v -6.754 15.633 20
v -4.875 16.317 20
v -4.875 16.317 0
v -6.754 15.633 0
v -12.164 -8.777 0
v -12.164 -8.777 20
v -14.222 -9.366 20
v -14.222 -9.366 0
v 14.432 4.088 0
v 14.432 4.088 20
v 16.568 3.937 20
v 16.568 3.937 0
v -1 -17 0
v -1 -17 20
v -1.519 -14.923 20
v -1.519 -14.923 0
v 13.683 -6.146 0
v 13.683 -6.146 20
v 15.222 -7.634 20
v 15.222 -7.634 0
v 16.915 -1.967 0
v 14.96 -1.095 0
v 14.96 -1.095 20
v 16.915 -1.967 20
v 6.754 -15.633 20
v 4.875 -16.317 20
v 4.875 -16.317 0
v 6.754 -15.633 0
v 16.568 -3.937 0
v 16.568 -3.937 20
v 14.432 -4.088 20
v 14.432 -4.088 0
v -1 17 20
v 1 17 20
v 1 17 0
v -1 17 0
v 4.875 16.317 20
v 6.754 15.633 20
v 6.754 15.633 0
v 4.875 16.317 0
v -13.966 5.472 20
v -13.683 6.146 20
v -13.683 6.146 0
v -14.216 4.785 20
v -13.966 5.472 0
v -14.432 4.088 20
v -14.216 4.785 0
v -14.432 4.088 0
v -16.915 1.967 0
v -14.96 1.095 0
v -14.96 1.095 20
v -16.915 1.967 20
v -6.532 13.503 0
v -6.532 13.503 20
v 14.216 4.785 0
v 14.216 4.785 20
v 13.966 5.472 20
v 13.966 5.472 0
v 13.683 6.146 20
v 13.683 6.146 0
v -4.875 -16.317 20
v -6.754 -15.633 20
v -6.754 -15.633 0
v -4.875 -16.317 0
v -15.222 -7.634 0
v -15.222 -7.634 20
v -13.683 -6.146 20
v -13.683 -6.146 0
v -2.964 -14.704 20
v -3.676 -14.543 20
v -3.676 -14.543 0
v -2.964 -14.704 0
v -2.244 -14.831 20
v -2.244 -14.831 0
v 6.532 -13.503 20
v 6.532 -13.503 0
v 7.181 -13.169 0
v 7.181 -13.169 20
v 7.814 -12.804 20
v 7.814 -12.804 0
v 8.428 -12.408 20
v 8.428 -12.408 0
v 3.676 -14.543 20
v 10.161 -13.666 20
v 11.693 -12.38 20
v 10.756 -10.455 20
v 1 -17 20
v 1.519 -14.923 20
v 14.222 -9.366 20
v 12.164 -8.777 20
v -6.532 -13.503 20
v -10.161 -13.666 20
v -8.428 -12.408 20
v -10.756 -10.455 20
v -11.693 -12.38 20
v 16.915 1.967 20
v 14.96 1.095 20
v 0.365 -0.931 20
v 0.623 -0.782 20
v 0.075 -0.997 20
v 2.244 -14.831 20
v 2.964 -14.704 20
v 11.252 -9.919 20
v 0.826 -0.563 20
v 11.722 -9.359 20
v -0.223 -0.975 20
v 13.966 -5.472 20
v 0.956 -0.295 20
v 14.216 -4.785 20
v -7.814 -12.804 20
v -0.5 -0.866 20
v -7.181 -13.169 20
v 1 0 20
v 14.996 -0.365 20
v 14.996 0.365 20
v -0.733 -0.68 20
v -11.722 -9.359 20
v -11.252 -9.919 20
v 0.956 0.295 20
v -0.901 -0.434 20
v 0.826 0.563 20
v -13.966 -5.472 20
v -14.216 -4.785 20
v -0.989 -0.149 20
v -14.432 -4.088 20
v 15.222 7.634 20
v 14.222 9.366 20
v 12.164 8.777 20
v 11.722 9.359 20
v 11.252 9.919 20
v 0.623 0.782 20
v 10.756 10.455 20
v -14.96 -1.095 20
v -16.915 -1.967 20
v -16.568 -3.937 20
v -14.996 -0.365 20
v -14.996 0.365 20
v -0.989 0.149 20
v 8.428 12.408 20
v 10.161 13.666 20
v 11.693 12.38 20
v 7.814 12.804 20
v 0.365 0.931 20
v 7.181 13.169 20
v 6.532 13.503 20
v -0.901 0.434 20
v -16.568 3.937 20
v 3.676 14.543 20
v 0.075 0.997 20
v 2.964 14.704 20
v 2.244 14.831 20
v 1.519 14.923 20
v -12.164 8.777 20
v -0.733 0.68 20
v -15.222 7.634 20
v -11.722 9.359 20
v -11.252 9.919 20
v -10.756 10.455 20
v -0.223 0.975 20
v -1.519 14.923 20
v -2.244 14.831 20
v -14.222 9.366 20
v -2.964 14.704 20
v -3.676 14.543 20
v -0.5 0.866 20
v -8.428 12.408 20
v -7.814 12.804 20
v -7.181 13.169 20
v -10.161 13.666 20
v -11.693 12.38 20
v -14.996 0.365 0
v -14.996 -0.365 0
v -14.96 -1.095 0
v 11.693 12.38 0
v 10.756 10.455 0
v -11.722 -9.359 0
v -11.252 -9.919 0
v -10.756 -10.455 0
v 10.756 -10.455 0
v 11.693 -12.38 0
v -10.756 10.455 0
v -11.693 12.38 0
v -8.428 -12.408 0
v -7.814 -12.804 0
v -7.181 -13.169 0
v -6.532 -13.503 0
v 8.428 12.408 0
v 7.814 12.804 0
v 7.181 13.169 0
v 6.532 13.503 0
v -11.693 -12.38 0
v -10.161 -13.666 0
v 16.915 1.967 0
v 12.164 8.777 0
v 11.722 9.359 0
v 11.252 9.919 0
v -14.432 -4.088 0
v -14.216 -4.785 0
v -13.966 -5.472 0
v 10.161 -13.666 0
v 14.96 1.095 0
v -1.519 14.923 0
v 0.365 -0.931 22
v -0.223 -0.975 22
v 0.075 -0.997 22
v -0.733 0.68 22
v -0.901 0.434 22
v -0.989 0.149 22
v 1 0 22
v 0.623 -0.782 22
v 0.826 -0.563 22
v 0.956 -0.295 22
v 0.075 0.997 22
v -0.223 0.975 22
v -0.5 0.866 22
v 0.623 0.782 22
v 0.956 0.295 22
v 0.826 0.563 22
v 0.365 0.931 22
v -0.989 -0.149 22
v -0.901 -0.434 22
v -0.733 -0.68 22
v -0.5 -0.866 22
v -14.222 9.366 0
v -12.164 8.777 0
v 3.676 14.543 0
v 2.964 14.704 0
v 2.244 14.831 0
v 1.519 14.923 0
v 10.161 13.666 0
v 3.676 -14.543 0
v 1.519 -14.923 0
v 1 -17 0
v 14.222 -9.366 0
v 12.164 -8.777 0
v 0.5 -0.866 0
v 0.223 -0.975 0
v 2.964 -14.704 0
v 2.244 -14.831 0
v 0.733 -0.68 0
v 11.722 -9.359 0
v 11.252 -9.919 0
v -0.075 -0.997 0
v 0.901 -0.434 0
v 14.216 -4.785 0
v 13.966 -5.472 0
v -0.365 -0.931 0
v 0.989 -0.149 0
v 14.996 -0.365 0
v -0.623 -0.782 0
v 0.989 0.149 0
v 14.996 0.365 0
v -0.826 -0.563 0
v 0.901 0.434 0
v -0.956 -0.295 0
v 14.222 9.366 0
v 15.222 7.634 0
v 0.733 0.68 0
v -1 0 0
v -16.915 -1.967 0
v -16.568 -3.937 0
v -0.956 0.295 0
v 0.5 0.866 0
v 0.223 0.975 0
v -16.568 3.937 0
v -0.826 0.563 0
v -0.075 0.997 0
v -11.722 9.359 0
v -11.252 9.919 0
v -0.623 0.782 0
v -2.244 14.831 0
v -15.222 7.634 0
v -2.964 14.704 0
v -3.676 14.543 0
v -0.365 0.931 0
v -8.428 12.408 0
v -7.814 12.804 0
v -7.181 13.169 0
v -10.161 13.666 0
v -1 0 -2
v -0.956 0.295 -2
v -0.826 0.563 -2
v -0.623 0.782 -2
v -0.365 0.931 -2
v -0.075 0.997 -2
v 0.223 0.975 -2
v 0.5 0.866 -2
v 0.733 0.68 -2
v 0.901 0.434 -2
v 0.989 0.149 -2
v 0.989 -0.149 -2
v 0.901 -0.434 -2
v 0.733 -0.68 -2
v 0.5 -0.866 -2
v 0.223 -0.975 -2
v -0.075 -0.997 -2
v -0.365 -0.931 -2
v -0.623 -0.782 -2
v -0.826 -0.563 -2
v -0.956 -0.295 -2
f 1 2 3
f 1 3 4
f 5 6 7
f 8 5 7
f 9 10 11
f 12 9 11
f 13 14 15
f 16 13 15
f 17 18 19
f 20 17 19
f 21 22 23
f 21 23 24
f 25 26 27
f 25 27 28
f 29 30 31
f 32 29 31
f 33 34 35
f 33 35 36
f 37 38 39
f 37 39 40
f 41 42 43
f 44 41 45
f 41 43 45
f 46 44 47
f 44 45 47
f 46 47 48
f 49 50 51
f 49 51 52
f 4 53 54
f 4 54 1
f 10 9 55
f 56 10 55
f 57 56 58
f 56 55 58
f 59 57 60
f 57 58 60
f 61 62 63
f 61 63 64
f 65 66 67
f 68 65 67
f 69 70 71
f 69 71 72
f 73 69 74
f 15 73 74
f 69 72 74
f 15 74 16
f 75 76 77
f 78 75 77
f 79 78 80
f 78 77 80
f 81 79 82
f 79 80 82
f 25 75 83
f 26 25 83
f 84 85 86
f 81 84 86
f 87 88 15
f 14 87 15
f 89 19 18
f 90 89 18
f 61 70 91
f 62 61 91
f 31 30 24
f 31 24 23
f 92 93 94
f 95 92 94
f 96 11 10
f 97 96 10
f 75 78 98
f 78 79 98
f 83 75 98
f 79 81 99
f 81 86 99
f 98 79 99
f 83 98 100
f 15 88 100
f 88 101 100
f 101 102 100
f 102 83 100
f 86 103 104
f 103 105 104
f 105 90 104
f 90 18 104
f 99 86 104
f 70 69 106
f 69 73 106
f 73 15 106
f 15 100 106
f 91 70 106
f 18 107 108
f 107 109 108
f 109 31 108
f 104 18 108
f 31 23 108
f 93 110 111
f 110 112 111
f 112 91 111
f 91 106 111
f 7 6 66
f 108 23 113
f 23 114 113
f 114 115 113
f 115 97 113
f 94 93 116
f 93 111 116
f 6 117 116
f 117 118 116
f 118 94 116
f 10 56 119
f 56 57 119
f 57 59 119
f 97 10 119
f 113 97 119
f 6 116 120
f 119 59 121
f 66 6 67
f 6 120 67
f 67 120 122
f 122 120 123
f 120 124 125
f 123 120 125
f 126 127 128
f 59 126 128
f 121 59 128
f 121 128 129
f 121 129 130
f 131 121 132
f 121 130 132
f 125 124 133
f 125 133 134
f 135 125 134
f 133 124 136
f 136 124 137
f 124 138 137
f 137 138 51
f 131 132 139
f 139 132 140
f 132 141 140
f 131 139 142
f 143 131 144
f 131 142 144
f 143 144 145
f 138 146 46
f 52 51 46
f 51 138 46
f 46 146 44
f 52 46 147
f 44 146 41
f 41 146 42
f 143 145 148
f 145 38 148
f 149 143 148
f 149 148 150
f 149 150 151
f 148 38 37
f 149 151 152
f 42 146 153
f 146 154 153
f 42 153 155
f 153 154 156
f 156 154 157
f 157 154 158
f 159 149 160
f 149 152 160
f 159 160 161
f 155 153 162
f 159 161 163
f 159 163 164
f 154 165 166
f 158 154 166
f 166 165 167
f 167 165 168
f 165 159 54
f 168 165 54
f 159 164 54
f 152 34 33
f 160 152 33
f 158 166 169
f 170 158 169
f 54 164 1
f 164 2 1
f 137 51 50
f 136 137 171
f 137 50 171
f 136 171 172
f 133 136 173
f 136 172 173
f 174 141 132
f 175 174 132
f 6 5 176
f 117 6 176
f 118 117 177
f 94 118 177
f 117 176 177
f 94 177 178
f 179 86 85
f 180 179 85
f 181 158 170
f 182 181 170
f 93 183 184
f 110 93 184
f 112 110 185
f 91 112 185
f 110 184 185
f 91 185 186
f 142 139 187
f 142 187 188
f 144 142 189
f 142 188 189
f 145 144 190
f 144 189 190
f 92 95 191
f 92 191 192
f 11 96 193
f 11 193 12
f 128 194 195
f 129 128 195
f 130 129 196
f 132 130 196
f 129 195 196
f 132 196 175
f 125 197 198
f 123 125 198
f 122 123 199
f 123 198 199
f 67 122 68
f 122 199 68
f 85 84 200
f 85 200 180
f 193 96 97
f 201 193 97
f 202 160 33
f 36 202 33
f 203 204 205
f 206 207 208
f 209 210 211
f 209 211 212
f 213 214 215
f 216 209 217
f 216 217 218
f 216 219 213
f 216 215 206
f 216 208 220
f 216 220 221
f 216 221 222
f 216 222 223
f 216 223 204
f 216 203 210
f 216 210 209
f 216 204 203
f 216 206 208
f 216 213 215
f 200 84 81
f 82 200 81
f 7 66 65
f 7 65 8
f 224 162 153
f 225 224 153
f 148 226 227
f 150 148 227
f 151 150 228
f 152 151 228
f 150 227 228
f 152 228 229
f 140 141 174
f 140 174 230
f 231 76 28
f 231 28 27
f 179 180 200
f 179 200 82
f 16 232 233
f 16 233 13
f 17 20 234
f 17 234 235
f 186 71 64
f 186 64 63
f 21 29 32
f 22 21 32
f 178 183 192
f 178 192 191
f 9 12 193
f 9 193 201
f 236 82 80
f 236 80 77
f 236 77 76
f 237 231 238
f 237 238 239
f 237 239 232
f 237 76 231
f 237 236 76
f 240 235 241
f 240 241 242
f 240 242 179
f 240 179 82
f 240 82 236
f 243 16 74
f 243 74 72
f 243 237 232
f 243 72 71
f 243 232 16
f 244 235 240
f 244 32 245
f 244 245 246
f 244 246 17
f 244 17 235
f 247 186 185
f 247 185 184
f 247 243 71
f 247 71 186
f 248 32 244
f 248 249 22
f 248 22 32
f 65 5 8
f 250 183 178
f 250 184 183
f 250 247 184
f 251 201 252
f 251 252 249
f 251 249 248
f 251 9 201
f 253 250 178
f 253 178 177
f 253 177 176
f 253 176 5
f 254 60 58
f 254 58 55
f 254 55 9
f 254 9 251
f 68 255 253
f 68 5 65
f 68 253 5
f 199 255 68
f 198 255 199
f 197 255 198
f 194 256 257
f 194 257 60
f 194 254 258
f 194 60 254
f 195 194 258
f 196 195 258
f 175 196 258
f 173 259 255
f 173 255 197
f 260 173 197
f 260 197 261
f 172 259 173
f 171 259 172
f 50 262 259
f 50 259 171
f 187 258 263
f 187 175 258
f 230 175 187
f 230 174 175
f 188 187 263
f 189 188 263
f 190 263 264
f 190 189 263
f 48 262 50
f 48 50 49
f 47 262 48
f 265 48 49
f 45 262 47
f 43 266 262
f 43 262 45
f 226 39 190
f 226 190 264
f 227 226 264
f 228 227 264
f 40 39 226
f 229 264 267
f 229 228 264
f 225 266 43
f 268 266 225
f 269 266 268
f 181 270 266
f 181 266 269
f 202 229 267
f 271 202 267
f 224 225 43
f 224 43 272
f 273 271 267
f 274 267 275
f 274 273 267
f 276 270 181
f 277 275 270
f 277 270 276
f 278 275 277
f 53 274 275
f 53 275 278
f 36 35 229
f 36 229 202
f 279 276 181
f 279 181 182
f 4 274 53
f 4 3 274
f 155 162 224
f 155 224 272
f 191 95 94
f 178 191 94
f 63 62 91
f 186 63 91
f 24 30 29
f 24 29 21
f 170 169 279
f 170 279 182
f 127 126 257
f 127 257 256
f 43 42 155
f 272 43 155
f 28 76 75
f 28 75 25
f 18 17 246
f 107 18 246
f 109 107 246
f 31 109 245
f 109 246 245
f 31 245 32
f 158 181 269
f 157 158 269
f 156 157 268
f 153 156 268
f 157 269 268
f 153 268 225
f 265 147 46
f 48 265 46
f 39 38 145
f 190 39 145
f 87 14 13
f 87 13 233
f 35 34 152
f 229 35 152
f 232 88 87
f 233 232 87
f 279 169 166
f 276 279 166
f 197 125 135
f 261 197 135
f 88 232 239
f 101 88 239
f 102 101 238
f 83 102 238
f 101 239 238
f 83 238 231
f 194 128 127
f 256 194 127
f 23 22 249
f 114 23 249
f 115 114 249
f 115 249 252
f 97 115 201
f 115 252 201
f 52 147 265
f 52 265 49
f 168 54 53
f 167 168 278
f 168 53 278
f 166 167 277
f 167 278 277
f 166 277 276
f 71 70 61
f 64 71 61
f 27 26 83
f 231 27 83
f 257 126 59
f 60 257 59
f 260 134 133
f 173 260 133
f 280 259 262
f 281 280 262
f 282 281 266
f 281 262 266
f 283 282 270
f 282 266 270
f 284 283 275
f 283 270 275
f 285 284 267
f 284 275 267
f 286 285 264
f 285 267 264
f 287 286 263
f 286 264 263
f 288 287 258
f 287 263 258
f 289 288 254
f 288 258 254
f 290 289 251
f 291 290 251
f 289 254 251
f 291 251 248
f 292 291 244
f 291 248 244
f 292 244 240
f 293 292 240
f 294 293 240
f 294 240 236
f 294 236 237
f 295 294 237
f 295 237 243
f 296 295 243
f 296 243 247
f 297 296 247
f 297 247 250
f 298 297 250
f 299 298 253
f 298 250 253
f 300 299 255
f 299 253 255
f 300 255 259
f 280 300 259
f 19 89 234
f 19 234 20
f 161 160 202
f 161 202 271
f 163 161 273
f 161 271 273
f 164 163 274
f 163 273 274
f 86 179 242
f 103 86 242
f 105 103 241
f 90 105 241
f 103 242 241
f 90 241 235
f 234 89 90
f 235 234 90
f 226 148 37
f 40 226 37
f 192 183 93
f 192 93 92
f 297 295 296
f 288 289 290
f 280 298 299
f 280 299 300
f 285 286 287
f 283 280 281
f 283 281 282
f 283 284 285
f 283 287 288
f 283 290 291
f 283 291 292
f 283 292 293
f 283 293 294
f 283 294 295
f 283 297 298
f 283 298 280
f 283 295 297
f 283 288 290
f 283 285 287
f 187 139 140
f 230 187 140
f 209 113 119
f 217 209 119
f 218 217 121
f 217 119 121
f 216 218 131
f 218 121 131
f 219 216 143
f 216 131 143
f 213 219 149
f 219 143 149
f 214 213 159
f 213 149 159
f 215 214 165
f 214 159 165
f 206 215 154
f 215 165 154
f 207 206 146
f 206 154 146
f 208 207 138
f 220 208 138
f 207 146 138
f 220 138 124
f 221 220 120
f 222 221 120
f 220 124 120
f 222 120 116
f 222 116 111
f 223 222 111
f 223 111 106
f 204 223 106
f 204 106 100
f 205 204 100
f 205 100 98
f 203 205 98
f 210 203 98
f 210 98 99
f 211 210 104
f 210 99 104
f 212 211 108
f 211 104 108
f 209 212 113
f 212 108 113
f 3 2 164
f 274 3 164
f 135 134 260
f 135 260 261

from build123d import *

# Parameters (mm, degrees)
SKETCH1_R           = 15
BOSS_EXTRUDE1_DEPTH = 20
BOSS_EXTRUDE2_DEPTH = 20
CIRPATTERN1_COUNT   = 18
SKETCH3_R           = 1
BOSS_EXTRUDE3_DEPTH = 2
SKETCH4_R           = 1
BOSS_EXTRUDE4_DEPTH = 2


with BuildPart() as part:
    # Sketch1 → Boss-Extrude1 (new body)
    with BuildSketch(Plane.XY):
        Circle(SKETCH1_R)
    extrude(amount=BOSS_EXTRUDE1_DEPTH)

    # Sketch2 → Boss-Extrude2 (add)
    with BuildSketch(Plane.XY.offset(20)):
        Polygon((0, 17), (1, 17), (2, 13), (0, 13), (-2, 13), (-1, 17), align=None)
    boss_extrude2 = extrude(amount=-BOSS_EXTRUDE2_DEPTH)

    # CirPattern1: Boss-Extrude2 ×18 about axis
    cirpattern1_axis = Axis((0, 0, 0), (0, 0, 1))
    for i in range(1, CIRPATTERN1_COUNT):
        add(boss_extrude2.rotate(cirpattern1_axis, i * 360 / CIRPATTERN1_COUNT))

    # Sketch3 → Boss-Extrude3 (add)
    with BuildSketch(Plane(origin=(0, 0, 0), x_dir=(-1, 0, 0), z_dir=(0, 0, -1))):
        Circle(SKETCH3_R)
    extrude(amount=BOSS_EXTRUDE3_DEPTH)

    # Sketch4 → Boss-Extrude4 (add)
    with BuildSketch(Plane.XY.offset(20)):
        Circle(SKETCH4_R)
    extrude(amount=BOSS_EXTRUDE4_DEPTH)


solid = part.part
